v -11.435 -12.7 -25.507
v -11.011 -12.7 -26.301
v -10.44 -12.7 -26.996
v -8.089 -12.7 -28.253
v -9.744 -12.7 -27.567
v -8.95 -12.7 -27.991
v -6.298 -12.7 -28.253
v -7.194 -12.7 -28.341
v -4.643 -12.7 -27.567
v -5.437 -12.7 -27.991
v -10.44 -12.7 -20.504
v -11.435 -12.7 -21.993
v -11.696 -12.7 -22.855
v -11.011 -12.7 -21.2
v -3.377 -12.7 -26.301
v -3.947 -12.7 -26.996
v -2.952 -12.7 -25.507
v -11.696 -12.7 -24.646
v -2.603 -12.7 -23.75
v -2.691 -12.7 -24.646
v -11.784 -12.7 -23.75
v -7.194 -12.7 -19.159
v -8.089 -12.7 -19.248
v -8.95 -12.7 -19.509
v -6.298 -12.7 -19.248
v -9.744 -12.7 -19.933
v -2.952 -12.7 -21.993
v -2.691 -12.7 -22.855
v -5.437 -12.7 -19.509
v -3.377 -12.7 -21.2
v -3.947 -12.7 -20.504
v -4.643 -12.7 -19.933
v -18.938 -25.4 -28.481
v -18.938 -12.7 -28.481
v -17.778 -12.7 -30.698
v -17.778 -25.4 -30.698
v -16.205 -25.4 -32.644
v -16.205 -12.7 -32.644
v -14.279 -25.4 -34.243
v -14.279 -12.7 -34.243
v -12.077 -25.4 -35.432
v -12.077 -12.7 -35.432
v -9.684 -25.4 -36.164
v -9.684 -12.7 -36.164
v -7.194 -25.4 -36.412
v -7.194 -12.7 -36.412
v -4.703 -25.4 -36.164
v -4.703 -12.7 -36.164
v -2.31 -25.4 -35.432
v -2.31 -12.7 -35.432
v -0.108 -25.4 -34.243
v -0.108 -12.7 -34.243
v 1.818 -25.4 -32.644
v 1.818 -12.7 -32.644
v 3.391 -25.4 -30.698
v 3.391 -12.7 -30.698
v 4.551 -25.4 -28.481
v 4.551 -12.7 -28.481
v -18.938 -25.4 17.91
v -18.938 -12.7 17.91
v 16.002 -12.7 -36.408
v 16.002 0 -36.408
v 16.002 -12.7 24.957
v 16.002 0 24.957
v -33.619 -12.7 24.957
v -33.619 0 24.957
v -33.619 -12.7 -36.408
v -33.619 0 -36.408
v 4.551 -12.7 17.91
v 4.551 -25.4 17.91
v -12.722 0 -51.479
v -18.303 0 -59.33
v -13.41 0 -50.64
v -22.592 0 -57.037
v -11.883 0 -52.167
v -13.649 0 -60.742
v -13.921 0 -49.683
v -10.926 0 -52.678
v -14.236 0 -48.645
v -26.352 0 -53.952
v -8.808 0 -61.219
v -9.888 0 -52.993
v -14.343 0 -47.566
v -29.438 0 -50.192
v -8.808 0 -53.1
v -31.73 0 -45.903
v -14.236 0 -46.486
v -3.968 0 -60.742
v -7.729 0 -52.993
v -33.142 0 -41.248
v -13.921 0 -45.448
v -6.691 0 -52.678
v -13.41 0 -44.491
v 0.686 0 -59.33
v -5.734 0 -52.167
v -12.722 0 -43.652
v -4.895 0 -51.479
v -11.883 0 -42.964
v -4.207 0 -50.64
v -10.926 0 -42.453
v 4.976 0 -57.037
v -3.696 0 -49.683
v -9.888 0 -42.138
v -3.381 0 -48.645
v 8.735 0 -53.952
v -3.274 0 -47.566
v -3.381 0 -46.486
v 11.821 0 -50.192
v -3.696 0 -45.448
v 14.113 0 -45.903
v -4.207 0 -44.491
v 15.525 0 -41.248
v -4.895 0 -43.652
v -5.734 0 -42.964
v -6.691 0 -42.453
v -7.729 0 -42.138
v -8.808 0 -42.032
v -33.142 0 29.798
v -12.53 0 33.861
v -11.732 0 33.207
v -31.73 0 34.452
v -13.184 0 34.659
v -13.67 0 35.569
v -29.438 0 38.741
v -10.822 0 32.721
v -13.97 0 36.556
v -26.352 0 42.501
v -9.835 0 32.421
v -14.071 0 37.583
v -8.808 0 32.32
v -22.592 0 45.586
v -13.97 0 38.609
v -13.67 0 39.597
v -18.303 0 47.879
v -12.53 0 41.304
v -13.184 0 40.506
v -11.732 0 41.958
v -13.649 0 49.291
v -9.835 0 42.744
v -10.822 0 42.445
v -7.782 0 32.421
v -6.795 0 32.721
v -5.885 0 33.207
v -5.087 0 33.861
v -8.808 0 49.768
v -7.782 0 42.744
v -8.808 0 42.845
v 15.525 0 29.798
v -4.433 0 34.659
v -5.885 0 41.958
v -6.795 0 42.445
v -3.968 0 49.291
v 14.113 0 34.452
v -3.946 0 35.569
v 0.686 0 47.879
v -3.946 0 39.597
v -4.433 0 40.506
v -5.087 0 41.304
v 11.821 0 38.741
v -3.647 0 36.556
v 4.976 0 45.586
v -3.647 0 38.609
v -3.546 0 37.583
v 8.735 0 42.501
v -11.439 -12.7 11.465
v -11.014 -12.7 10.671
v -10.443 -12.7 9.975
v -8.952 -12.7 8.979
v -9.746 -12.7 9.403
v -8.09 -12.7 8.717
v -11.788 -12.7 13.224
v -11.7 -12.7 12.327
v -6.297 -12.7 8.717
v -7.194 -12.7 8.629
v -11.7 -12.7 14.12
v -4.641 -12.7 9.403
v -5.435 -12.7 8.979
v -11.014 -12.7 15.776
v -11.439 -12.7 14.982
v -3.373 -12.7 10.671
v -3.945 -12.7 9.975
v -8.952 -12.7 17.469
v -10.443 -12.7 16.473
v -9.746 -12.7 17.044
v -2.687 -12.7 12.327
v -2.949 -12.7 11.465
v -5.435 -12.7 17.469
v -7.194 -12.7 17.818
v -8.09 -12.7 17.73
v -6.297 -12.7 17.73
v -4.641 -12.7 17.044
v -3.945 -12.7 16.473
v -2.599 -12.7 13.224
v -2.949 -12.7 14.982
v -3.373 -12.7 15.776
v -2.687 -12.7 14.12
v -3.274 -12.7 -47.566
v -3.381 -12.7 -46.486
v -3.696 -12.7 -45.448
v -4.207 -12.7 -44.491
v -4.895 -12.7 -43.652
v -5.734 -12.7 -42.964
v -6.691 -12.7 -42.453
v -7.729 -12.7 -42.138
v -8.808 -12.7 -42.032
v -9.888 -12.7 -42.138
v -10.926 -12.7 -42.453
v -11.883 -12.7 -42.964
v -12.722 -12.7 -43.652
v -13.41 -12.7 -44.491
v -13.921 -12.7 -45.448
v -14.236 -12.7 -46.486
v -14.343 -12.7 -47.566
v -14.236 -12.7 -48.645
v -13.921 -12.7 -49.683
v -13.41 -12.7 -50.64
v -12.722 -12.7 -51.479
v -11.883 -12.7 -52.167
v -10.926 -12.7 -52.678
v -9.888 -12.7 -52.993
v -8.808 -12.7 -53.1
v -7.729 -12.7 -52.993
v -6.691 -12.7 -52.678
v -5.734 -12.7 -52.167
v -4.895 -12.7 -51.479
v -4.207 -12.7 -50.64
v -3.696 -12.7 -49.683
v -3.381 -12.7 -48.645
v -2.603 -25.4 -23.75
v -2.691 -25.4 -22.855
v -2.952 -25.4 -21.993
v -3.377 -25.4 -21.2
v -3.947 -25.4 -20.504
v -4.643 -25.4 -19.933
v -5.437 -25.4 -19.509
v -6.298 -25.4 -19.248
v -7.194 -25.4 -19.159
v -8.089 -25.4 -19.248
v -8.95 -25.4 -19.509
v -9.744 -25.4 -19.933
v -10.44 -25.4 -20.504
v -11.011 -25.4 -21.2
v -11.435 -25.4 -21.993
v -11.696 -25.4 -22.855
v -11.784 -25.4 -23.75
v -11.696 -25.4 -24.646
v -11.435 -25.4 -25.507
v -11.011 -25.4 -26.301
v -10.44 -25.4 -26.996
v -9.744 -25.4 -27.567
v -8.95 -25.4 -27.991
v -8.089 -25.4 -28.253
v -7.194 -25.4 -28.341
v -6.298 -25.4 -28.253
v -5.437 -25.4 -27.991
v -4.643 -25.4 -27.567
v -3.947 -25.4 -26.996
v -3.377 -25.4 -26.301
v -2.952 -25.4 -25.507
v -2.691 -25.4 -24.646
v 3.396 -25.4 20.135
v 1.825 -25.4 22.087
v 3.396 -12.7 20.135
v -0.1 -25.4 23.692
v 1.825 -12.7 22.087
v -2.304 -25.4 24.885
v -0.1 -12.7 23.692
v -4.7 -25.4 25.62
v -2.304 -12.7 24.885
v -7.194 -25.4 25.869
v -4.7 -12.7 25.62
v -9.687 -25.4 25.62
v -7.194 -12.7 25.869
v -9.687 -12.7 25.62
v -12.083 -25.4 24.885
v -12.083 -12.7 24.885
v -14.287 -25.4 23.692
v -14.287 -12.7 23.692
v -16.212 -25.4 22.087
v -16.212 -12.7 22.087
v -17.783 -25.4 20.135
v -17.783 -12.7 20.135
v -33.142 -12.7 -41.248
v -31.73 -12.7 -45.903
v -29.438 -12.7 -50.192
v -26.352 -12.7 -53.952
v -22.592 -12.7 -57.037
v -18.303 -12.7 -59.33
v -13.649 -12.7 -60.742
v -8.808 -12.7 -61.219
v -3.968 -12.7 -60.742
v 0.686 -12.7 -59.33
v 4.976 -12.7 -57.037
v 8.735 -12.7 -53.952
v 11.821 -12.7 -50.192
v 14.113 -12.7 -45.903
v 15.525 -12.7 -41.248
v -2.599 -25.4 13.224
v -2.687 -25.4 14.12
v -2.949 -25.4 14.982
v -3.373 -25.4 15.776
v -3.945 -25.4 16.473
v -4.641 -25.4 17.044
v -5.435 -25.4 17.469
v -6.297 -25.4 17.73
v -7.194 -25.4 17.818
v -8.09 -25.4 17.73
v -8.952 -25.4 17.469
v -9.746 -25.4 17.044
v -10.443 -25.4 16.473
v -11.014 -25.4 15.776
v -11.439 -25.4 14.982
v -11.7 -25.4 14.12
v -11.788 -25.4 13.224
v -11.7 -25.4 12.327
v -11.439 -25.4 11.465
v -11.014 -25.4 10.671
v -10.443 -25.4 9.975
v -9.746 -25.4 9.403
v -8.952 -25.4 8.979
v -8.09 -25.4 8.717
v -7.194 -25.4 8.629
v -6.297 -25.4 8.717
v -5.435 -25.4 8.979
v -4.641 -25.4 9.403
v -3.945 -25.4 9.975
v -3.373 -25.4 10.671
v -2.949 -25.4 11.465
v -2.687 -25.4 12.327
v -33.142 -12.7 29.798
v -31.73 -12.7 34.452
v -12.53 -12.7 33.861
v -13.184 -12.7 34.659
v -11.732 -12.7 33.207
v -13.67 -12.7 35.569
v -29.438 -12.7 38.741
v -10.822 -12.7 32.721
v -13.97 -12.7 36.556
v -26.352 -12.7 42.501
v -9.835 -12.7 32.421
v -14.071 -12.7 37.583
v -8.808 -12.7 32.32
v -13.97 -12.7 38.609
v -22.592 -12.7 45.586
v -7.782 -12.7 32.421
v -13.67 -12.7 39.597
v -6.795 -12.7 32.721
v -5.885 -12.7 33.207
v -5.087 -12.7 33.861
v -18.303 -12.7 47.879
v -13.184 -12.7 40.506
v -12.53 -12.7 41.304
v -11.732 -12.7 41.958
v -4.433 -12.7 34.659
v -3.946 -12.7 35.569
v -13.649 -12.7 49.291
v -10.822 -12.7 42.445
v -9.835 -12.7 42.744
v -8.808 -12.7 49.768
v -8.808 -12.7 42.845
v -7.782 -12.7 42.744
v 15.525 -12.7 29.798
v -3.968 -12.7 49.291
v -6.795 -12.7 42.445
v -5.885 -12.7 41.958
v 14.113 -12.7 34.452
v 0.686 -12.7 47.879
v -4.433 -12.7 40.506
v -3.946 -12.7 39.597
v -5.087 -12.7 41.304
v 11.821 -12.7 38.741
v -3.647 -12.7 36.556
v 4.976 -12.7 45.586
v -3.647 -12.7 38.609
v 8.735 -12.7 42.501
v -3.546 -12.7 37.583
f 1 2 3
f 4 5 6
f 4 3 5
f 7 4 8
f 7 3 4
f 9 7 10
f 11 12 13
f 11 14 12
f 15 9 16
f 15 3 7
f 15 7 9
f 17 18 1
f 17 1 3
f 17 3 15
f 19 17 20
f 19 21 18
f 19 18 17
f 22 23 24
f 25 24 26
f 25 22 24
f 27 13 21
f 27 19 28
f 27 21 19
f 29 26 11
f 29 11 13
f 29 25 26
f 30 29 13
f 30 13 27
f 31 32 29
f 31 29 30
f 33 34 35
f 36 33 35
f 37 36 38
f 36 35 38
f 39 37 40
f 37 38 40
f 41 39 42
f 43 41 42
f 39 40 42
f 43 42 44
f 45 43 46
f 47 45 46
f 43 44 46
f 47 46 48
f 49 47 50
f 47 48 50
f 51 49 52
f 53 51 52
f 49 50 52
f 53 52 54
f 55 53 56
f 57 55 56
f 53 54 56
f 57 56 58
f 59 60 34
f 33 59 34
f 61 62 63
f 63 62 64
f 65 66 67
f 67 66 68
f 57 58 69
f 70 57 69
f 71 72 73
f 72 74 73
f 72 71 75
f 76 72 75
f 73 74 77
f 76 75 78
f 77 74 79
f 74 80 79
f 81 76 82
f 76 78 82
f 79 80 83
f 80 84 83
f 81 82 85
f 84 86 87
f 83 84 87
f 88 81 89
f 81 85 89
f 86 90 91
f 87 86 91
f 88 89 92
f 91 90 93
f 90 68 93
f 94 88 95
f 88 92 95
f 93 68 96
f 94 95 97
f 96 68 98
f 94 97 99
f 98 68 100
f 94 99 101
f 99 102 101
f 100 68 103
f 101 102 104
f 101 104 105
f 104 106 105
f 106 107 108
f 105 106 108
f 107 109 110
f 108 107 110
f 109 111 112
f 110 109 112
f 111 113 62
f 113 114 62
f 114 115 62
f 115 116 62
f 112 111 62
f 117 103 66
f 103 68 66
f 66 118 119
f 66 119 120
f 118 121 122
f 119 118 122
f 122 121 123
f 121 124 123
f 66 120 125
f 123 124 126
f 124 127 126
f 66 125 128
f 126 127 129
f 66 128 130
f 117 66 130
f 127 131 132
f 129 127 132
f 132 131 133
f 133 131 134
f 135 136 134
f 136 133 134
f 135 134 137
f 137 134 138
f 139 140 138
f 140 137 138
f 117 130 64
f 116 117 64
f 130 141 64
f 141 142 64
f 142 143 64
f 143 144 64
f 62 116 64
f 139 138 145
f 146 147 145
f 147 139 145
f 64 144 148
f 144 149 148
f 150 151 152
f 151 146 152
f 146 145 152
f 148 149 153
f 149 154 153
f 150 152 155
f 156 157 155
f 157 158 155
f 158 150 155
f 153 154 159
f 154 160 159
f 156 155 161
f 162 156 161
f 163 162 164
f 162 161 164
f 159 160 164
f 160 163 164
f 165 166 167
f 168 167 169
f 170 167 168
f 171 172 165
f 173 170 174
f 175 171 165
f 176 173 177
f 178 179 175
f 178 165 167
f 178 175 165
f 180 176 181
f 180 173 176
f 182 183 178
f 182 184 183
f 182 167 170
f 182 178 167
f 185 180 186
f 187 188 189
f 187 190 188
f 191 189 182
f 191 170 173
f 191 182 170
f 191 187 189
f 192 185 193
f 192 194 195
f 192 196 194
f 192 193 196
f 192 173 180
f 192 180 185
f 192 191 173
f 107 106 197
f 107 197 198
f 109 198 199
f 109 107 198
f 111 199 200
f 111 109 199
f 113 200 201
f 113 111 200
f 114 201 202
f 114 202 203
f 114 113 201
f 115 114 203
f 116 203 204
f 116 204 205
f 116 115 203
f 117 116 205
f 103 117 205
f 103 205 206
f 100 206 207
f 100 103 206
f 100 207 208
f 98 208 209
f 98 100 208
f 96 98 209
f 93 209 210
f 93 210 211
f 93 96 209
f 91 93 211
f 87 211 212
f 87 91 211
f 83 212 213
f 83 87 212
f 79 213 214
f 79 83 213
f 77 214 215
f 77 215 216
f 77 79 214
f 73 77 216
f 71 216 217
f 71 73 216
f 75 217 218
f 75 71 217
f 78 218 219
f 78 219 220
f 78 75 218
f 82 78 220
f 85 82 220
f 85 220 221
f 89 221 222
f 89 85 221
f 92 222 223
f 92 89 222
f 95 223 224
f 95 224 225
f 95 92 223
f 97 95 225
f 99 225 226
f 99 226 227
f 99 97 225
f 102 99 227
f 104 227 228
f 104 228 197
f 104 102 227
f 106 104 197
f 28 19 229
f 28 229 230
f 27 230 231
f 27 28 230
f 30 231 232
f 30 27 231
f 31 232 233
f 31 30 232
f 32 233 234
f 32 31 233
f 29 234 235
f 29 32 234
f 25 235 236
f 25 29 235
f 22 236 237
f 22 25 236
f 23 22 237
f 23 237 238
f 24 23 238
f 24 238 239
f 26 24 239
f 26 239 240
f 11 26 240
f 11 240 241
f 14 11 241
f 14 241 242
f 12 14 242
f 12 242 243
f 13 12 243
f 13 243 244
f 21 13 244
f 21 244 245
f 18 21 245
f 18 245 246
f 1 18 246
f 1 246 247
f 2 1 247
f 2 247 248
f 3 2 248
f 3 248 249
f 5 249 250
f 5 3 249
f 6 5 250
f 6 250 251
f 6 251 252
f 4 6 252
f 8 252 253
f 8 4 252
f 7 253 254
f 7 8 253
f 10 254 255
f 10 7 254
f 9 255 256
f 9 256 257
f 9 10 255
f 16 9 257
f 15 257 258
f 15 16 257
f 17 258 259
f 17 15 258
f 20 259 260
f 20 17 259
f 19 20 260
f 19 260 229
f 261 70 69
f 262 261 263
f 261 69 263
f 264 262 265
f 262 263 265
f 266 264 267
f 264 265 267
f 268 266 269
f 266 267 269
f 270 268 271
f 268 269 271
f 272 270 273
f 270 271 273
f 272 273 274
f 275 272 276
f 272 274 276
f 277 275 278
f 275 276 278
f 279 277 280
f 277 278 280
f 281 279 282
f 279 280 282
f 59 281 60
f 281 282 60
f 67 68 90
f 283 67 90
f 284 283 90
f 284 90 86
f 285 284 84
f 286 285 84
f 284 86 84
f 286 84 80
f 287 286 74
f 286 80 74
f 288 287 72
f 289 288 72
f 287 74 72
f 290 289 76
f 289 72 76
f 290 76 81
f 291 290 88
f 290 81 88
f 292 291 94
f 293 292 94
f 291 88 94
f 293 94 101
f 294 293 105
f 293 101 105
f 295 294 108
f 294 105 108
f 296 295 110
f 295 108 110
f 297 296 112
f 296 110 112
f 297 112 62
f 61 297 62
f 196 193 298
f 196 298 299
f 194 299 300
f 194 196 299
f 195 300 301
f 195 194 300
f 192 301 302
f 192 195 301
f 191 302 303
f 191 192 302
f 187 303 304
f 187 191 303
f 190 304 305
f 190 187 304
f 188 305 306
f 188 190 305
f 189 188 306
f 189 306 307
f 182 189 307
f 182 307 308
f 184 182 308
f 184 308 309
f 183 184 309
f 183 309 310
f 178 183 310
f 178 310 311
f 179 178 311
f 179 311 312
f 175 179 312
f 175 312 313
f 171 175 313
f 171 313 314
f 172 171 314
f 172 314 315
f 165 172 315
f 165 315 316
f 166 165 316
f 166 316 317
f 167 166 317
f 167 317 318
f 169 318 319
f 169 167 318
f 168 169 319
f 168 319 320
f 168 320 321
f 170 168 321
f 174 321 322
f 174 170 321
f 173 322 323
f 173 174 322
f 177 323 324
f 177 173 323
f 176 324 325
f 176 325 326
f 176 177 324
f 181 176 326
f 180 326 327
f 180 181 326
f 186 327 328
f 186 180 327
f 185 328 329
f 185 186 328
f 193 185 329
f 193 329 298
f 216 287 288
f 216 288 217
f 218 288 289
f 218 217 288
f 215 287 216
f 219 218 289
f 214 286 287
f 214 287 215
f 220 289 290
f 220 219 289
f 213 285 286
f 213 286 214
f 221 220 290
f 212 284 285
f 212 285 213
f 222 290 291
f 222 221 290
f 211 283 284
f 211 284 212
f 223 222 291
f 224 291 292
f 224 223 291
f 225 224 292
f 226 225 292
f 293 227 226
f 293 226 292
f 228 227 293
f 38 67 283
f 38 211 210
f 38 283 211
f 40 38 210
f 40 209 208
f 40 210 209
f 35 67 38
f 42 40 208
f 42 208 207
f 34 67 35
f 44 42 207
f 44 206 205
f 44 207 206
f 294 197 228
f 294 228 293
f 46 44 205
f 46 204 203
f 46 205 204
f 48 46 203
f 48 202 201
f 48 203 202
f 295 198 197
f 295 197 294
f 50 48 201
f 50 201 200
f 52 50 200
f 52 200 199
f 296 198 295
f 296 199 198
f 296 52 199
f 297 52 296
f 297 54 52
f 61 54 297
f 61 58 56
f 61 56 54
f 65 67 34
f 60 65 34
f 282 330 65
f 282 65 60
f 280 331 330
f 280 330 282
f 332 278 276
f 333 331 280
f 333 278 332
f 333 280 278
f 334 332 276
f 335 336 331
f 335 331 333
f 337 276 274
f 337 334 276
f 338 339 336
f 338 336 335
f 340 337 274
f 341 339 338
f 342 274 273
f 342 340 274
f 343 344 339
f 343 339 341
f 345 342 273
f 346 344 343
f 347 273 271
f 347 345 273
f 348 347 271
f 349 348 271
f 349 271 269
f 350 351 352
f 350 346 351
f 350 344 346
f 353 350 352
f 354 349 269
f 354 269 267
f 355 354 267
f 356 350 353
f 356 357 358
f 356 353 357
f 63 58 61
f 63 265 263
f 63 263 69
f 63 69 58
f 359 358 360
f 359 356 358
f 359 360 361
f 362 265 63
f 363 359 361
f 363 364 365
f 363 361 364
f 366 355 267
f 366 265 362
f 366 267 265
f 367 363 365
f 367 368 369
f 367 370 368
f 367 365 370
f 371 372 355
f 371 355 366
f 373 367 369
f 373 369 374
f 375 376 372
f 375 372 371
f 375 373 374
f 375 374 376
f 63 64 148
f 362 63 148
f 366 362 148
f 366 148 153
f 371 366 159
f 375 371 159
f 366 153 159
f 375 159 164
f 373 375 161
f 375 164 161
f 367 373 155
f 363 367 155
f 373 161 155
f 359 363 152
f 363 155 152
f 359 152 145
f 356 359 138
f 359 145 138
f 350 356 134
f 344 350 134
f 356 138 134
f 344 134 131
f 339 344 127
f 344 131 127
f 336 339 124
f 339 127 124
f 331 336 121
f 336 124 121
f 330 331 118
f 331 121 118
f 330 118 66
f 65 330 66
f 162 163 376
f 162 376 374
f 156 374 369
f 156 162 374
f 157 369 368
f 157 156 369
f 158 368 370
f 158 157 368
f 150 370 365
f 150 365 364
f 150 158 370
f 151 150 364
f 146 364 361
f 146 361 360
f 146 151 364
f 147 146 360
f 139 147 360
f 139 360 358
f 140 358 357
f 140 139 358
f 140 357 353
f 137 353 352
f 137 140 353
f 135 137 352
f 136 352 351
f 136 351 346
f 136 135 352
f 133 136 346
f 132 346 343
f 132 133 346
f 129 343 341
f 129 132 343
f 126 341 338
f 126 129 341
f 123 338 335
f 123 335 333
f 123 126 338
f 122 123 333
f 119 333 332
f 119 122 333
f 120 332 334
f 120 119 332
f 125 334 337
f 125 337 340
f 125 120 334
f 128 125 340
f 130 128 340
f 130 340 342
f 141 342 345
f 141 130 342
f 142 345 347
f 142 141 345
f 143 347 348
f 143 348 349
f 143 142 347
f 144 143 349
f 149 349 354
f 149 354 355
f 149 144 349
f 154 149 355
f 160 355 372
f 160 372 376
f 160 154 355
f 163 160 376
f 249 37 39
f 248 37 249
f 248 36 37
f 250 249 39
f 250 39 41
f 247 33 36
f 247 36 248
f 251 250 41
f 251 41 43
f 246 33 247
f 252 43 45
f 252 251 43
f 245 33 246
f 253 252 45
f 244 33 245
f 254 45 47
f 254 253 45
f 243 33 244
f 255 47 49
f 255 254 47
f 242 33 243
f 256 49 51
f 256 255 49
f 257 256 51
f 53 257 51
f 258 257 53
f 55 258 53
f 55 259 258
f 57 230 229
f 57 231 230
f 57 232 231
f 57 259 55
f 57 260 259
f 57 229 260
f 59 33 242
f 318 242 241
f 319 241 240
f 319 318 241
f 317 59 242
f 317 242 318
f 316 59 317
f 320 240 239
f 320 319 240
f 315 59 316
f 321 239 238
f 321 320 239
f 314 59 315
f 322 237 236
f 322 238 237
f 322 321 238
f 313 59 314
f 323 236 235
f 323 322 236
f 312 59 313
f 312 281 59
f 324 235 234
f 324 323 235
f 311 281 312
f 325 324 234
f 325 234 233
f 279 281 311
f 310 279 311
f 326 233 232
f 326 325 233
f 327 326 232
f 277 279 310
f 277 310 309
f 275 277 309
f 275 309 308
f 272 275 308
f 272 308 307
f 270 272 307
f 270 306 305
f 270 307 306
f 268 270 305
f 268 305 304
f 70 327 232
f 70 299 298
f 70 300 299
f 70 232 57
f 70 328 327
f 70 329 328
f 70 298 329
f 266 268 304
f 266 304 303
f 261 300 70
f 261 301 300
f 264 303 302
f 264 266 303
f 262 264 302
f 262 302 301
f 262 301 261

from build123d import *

# Parameters (mm, degrees)
F0_R     = 5.534072
F0_R_2   = 5.262589
F1_DEPTH = 12.7
F2_R     = 4.5907
F2_R_2   = 4.594767
F3_DEPTH = 25.4


with BuildPart() as f1:
    # F0 (on Front) → F1 (new body)
    with BuildSketch(Plane.XZ):
        with BuildLine():
            ThreePointArc((16.002001, 24.957247), (-8.808441, 49.767689), (-33.618882, 24.957247))
            Line((-33.618882, 24.957247), (-33.618882, -36.408219))
            ThreePointArc((-33.618882, -36.408219), (-8.808441, -61.218661), (16.002001, -36.408219))
            Line((16.002001, -36.408219), (16.002001, 24.957247))
        make_face()
        with Locations((-8.808441, -47.565579)):
            Circle(F0_R, mode=Mode.SUBTRACT)
        with Locations((-8.808441, 37.582681)):
            Circle(F0_R_2, mode=Mode.SUBTRACT)
    extrude(amount=F1_DEPTH)

    # F2 (on Front) → F3 (join)
    with BuildSketch(Plane.XZ):
        with BuildLine():
            ThreePointArc((4.551028, 17.910495), (-7.193559, 25.868808), (-18.938147, 17.910495))
            Line((-18.938147, 17.910495), (-18.938147, -28.480623))
            ThreePointArc((-18.938147, -28.480623), (-7.193559, -36.411624), (4.551028, -28.480623))
            Line((4.551028, -28.480623), (4.551028, 17.910495))
        make_face()
        with Locations((-7.193559, -23.750164)):
            Circle(F2_R, mode=Mode.SUBTRACT)
        with Locations((-7.193559, 13.223535)):
            Circle(F2_R_2, mode=Mode.SUBTRACT)
    extrude(amount=F3_DEPTH)


solid = f1.part
